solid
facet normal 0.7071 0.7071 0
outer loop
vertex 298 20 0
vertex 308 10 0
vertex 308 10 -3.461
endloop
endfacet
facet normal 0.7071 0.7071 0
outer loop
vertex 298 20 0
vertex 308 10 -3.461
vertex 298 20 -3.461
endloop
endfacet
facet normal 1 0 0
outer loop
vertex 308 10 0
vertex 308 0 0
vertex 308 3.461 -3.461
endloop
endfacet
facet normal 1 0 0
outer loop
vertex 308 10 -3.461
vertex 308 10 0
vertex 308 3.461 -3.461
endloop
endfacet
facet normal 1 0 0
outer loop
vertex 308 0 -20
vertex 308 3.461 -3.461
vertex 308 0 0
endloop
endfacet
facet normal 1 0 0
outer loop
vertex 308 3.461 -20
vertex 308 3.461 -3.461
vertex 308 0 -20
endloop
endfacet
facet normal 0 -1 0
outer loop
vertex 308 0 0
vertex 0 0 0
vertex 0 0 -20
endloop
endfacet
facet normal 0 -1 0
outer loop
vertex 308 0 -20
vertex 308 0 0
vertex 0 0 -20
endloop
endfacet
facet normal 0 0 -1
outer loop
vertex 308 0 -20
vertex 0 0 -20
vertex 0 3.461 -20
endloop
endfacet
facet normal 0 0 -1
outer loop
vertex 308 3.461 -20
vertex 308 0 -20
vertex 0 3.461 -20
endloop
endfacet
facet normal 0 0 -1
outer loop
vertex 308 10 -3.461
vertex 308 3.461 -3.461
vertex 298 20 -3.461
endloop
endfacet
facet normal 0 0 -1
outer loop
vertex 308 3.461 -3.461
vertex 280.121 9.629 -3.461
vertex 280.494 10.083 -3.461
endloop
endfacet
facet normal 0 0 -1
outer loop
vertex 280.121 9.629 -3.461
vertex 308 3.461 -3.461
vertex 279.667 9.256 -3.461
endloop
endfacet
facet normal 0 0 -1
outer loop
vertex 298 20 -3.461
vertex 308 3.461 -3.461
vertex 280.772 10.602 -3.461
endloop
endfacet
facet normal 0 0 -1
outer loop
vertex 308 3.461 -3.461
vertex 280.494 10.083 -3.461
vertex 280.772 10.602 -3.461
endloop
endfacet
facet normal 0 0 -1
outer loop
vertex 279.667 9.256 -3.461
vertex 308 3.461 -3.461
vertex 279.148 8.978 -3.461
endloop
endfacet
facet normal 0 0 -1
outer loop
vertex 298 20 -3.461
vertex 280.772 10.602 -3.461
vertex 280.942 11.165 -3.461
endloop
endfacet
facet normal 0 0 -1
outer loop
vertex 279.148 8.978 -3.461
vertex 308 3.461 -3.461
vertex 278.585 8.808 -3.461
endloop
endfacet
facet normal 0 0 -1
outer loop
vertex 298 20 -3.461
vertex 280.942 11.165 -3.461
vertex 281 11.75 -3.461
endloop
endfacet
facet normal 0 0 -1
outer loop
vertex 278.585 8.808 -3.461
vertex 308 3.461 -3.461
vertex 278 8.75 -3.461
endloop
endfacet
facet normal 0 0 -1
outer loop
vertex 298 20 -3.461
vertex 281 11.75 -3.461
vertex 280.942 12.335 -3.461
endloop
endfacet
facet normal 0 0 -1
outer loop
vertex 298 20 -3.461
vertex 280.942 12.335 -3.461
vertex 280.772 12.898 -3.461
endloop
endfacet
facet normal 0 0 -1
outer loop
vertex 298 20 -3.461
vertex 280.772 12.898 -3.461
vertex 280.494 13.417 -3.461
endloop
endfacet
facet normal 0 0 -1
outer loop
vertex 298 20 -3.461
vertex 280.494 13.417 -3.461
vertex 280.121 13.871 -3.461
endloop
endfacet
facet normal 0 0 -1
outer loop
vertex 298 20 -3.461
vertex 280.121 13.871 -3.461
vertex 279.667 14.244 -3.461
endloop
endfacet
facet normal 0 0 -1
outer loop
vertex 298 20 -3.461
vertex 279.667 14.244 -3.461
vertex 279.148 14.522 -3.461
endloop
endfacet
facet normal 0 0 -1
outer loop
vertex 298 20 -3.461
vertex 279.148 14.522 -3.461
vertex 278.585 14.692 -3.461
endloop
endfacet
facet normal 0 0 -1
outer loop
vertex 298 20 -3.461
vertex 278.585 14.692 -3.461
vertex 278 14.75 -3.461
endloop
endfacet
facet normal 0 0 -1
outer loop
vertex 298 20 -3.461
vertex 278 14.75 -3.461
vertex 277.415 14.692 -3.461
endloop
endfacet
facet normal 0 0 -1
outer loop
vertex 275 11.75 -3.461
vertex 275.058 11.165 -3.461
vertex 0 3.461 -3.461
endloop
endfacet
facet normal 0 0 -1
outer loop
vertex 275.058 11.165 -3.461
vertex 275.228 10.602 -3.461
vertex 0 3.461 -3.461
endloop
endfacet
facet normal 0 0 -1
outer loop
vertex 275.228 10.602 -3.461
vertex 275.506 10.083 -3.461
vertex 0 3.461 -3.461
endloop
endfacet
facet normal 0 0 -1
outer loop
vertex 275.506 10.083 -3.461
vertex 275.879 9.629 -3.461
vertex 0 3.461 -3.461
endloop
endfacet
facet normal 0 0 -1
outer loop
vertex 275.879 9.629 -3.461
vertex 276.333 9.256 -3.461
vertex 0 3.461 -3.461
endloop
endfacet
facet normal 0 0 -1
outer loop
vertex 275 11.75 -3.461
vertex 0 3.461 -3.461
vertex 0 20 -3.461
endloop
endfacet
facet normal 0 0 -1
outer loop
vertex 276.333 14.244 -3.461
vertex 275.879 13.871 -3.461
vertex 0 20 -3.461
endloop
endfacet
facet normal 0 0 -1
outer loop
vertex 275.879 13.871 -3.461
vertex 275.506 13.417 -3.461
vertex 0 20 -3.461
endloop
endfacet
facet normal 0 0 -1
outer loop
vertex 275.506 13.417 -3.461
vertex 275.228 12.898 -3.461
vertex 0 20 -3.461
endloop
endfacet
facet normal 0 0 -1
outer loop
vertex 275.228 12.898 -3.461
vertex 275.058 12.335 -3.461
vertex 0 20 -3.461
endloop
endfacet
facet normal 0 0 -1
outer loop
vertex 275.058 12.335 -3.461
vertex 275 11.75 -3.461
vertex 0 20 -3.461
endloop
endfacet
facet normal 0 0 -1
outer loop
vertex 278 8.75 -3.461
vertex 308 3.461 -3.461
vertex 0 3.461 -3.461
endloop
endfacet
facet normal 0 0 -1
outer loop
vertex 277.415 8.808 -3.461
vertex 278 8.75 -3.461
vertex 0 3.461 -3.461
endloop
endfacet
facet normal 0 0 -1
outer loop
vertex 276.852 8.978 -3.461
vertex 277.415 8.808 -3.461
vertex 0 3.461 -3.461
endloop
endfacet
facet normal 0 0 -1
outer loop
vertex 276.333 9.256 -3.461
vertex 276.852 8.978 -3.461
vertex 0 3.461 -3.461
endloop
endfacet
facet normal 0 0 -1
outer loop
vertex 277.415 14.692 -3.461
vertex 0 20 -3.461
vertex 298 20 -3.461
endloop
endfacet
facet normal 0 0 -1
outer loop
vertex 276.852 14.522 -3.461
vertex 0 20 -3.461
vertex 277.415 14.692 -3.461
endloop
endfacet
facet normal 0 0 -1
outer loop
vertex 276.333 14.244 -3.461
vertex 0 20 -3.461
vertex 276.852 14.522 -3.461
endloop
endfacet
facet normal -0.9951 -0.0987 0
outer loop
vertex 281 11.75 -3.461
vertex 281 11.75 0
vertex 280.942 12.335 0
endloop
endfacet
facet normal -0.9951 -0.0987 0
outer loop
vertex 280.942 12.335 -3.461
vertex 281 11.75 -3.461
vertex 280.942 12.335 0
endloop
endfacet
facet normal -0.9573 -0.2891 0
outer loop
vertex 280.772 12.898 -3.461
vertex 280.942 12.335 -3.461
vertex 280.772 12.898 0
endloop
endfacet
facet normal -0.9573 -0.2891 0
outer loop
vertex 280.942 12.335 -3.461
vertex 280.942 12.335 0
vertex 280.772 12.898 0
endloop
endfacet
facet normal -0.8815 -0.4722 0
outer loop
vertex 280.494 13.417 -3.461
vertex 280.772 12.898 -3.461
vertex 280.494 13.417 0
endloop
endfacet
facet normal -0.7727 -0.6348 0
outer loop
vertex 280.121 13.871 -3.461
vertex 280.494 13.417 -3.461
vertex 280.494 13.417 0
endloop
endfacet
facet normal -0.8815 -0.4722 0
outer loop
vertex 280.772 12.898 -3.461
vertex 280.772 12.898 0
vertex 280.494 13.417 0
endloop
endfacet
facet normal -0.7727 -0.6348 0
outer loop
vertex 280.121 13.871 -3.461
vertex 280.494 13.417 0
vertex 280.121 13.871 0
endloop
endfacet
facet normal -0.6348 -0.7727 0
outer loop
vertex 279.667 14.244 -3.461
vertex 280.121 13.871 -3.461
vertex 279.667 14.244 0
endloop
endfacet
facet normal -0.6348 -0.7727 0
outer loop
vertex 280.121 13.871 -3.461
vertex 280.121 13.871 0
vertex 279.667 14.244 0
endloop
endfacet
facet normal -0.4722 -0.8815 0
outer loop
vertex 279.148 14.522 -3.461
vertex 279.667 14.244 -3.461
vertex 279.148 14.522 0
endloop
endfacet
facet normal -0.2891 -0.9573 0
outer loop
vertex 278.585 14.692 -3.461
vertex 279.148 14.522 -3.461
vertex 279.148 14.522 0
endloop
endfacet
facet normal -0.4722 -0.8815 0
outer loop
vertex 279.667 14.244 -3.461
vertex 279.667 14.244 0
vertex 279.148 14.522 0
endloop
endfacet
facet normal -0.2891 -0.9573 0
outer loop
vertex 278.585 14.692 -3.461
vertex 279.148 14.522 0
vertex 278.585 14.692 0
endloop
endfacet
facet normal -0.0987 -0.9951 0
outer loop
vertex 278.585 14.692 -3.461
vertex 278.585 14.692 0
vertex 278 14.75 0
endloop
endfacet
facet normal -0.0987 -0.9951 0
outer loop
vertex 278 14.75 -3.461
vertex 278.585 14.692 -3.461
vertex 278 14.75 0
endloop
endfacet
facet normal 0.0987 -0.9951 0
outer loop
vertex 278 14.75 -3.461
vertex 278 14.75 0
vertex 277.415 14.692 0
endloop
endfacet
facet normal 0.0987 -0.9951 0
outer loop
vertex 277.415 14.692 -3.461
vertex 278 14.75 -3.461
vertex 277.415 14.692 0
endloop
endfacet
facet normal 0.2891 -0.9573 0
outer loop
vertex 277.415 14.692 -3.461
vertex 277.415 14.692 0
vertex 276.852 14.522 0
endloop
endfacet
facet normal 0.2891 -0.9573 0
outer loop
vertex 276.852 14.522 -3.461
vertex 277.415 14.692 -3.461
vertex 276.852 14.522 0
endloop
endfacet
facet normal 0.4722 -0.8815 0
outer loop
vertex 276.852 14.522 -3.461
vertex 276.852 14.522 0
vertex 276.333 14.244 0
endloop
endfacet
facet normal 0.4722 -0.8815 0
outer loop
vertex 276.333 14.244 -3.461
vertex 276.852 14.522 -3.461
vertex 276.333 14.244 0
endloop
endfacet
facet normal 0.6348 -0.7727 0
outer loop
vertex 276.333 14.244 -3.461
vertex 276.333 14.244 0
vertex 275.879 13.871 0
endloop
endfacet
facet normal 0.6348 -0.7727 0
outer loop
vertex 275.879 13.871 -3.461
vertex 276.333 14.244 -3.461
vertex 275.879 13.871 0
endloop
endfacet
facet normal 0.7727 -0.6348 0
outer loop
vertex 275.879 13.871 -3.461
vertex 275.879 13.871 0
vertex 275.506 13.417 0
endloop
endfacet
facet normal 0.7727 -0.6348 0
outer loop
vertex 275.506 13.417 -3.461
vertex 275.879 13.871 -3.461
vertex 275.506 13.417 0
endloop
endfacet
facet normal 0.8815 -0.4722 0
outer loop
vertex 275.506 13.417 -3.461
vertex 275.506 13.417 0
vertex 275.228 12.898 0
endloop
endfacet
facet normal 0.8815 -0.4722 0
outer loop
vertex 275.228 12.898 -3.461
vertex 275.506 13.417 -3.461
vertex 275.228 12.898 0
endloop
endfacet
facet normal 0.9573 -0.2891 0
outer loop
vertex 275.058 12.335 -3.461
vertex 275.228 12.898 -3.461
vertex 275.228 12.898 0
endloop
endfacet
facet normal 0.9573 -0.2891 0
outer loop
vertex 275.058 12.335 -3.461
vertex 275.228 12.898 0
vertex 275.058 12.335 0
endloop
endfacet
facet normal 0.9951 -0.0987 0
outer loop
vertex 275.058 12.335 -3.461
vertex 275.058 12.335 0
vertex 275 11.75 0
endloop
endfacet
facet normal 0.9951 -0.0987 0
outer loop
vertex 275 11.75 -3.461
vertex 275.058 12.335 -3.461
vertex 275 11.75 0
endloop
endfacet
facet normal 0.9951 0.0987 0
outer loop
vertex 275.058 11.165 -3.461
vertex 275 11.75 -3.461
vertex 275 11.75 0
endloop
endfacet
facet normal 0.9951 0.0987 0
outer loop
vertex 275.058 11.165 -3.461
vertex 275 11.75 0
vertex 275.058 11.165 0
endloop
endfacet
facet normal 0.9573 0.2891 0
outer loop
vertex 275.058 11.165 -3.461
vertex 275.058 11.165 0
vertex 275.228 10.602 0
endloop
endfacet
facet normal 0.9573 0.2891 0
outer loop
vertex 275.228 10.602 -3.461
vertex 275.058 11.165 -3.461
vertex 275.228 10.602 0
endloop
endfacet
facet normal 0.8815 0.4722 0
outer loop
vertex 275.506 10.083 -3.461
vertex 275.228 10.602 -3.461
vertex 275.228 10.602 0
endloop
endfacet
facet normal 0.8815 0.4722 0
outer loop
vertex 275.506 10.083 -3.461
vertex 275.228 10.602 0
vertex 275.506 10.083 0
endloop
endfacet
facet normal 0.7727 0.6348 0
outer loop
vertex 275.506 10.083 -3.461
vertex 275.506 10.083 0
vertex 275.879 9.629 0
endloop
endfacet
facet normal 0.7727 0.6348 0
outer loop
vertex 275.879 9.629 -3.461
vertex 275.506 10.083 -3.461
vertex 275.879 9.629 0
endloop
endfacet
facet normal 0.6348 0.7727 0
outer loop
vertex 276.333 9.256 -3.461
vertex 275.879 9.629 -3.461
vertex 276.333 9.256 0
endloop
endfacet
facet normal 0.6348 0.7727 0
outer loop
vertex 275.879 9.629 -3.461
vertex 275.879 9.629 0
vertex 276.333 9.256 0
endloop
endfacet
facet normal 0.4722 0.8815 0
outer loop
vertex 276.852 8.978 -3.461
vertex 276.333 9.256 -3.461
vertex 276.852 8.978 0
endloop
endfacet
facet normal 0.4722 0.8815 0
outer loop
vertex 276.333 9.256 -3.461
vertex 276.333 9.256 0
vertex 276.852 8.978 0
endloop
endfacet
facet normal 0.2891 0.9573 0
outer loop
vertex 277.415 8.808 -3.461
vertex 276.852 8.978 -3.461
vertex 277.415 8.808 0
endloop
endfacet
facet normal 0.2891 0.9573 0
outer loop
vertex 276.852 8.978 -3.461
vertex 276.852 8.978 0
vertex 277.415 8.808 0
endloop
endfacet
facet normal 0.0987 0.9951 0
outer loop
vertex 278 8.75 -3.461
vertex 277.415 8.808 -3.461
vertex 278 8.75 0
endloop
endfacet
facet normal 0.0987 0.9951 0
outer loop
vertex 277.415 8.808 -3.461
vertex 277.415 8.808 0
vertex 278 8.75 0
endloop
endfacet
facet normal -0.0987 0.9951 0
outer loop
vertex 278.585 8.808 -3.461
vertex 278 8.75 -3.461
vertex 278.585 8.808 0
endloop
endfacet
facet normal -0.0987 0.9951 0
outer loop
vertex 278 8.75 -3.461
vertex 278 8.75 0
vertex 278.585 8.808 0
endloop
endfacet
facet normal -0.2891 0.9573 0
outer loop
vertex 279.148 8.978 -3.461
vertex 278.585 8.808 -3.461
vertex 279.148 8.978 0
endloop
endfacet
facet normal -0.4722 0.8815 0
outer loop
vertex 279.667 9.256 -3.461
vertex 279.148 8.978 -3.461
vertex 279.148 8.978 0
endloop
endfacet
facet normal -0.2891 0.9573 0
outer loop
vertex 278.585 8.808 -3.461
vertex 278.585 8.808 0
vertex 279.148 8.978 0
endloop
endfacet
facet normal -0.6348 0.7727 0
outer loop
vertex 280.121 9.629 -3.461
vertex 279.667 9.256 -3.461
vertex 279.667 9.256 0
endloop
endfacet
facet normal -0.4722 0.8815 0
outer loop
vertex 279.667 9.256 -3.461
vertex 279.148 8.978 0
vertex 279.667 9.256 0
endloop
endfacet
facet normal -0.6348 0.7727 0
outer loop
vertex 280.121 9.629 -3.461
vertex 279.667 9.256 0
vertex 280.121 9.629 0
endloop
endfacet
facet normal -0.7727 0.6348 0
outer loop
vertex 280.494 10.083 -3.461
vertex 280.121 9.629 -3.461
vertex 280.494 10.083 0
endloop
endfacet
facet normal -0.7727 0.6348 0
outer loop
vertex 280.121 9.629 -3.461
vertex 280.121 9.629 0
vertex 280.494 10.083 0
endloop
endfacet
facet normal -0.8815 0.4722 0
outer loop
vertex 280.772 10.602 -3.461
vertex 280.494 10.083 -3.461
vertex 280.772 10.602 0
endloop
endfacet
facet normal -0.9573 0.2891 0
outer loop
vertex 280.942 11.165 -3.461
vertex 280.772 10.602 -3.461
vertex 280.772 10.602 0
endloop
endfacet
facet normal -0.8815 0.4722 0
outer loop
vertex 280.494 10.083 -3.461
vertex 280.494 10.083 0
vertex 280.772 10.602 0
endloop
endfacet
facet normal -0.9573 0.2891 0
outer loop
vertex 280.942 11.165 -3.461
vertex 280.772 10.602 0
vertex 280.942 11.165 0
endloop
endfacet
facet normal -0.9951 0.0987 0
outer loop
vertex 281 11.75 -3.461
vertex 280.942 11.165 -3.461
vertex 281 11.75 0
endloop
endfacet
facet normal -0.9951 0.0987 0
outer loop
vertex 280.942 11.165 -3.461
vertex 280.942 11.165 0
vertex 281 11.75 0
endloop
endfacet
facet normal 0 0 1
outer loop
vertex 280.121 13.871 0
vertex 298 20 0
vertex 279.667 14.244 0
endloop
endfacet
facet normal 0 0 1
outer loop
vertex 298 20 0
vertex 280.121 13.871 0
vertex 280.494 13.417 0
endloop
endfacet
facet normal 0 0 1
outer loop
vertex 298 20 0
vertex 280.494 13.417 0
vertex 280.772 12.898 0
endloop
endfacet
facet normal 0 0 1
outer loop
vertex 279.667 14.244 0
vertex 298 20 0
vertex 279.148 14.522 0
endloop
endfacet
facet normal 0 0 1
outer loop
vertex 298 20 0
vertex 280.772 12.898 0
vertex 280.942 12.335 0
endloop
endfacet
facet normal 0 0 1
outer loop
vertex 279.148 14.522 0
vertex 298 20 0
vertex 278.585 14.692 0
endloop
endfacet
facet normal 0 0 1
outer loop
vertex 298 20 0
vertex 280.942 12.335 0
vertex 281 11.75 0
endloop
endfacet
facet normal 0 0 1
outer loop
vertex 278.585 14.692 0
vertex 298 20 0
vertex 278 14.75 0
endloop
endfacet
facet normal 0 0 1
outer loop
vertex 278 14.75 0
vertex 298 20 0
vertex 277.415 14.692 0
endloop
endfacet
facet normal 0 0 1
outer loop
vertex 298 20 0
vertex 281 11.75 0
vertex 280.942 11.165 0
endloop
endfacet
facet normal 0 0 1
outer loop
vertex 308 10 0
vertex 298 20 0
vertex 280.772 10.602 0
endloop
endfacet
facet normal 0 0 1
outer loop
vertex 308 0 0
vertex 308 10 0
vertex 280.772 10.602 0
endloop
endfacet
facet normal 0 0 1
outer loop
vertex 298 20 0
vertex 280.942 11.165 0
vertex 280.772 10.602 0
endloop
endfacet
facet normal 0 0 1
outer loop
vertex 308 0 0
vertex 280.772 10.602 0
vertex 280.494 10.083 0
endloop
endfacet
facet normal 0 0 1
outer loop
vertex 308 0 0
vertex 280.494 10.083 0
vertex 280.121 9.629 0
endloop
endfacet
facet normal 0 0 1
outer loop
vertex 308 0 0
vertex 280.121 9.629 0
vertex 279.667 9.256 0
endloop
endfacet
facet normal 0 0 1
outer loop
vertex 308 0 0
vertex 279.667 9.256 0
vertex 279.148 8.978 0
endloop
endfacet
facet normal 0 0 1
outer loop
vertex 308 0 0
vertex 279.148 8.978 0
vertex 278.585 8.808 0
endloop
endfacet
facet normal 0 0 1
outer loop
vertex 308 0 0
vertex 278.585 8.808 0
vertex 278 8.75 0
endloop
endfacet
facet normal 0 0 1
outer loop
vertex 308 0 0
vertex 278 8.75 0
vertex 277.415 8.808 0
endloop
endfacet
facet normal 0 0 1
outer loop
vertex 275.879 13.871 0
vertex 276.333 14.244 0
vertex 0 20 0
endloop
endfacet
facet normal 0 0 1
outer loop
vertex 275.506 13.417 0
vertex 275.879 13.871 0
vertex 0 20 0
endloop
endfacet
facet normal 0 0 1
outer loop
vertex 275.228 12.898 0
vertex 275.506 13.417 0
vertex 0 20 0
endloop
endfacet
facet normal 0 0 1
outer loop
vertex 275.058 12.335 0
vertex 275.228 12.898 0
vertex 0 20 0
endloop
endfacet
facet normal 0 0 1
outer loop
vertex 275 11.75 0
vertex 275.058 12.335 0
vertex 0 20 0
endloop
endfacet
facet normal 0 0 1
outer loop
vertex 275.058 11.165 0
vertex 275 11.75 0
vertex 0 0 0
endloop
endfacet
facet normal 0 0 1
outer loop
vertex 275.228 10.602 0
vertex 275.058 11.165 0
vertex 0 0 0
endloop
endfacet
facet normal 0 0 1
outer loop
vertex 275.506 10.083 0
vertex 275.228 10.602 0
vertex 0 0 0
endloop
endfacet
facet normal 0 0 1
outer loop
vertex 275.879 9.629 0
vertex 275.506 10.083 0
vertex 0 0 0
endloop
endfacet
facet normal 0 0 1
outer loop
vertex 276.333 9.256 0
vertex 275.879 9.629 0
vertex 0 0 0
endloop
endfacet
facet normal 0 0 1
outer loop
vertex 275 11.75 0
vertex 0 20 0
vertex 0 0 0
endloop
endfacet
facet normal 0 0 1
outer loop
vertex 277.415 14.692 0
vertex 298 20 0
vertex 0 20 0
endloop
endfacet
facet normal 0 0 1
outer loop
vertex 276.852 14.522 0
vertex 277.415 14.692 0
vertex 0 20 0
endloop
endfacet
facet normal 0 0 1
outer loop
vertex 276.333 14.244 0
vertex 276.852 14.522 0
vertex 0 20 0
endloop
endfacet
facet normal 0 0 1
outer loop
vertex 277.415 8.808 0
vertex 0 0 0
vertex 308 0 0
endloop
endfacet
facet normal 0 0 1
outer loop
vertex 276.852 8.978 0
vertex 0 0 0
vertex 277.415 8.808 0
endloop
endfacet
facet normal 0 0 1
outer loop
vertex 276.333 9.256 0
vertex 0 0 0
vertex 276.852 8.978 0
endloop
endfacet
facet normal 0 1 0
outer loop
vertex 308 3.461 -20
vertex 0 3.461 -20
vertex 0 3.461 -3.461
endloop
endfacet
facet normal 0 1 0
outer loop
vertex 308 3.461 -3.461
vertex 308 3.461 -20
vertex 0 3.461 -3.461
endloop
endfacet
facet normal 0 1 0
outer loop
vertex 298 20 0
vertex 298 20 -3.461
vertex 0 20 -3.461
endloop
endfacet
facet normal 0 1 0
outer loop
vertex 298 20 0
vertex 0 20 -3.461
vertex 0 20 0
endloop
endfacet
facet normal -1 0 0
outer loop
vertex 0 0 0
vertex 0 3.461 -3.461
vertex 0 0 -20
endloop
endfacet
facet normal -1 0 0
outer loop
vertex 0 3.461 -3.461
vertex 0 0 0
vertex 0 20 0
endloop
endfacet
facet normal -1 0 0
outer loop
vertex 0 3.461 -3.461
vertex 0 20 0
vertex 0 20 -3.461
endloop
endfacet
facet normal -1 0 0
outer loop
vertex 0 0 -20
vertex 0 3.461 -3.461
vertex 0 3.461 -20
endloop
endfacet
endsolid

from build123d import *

# Parameters (mm, degrees)
BOSS_EXTRUDE1_DEPTH = 308
SKETCH2_R           = 3
CUT_EXTRUDE1_DEPTH  = 310.295974756


with BuildPart() as part:
    # Sketch1 → Boss-Extrude1 (new body)
    with BuildSketch(Plane(origin=(0, 0, 0), x_dir=(0, 0, -1), z_dir=(1, 0, 0))):
        Polygon((0, 0), (20, 0), (20, 3.461178467), (3.461178467, 3.461178467), (3.461178467, 20), (0, 20), align=None)
    extrude(amount=BOSS_EXTRUDE1_DEPTH)

    # Sketch2 → Cut-Extrude1 (cut, through all)
    with BuildSketch(Plane.XY):
        with Locations((278, 11.75)):
            Circle(SKETCH2_R)
        Polygon((308, 10), (298, 20), (308, 20), align=None)
    extrude(amount=-CUT_EXTRUDE1_DEPTH, mode=Mode.SUBTRACT)


solid = part.part
